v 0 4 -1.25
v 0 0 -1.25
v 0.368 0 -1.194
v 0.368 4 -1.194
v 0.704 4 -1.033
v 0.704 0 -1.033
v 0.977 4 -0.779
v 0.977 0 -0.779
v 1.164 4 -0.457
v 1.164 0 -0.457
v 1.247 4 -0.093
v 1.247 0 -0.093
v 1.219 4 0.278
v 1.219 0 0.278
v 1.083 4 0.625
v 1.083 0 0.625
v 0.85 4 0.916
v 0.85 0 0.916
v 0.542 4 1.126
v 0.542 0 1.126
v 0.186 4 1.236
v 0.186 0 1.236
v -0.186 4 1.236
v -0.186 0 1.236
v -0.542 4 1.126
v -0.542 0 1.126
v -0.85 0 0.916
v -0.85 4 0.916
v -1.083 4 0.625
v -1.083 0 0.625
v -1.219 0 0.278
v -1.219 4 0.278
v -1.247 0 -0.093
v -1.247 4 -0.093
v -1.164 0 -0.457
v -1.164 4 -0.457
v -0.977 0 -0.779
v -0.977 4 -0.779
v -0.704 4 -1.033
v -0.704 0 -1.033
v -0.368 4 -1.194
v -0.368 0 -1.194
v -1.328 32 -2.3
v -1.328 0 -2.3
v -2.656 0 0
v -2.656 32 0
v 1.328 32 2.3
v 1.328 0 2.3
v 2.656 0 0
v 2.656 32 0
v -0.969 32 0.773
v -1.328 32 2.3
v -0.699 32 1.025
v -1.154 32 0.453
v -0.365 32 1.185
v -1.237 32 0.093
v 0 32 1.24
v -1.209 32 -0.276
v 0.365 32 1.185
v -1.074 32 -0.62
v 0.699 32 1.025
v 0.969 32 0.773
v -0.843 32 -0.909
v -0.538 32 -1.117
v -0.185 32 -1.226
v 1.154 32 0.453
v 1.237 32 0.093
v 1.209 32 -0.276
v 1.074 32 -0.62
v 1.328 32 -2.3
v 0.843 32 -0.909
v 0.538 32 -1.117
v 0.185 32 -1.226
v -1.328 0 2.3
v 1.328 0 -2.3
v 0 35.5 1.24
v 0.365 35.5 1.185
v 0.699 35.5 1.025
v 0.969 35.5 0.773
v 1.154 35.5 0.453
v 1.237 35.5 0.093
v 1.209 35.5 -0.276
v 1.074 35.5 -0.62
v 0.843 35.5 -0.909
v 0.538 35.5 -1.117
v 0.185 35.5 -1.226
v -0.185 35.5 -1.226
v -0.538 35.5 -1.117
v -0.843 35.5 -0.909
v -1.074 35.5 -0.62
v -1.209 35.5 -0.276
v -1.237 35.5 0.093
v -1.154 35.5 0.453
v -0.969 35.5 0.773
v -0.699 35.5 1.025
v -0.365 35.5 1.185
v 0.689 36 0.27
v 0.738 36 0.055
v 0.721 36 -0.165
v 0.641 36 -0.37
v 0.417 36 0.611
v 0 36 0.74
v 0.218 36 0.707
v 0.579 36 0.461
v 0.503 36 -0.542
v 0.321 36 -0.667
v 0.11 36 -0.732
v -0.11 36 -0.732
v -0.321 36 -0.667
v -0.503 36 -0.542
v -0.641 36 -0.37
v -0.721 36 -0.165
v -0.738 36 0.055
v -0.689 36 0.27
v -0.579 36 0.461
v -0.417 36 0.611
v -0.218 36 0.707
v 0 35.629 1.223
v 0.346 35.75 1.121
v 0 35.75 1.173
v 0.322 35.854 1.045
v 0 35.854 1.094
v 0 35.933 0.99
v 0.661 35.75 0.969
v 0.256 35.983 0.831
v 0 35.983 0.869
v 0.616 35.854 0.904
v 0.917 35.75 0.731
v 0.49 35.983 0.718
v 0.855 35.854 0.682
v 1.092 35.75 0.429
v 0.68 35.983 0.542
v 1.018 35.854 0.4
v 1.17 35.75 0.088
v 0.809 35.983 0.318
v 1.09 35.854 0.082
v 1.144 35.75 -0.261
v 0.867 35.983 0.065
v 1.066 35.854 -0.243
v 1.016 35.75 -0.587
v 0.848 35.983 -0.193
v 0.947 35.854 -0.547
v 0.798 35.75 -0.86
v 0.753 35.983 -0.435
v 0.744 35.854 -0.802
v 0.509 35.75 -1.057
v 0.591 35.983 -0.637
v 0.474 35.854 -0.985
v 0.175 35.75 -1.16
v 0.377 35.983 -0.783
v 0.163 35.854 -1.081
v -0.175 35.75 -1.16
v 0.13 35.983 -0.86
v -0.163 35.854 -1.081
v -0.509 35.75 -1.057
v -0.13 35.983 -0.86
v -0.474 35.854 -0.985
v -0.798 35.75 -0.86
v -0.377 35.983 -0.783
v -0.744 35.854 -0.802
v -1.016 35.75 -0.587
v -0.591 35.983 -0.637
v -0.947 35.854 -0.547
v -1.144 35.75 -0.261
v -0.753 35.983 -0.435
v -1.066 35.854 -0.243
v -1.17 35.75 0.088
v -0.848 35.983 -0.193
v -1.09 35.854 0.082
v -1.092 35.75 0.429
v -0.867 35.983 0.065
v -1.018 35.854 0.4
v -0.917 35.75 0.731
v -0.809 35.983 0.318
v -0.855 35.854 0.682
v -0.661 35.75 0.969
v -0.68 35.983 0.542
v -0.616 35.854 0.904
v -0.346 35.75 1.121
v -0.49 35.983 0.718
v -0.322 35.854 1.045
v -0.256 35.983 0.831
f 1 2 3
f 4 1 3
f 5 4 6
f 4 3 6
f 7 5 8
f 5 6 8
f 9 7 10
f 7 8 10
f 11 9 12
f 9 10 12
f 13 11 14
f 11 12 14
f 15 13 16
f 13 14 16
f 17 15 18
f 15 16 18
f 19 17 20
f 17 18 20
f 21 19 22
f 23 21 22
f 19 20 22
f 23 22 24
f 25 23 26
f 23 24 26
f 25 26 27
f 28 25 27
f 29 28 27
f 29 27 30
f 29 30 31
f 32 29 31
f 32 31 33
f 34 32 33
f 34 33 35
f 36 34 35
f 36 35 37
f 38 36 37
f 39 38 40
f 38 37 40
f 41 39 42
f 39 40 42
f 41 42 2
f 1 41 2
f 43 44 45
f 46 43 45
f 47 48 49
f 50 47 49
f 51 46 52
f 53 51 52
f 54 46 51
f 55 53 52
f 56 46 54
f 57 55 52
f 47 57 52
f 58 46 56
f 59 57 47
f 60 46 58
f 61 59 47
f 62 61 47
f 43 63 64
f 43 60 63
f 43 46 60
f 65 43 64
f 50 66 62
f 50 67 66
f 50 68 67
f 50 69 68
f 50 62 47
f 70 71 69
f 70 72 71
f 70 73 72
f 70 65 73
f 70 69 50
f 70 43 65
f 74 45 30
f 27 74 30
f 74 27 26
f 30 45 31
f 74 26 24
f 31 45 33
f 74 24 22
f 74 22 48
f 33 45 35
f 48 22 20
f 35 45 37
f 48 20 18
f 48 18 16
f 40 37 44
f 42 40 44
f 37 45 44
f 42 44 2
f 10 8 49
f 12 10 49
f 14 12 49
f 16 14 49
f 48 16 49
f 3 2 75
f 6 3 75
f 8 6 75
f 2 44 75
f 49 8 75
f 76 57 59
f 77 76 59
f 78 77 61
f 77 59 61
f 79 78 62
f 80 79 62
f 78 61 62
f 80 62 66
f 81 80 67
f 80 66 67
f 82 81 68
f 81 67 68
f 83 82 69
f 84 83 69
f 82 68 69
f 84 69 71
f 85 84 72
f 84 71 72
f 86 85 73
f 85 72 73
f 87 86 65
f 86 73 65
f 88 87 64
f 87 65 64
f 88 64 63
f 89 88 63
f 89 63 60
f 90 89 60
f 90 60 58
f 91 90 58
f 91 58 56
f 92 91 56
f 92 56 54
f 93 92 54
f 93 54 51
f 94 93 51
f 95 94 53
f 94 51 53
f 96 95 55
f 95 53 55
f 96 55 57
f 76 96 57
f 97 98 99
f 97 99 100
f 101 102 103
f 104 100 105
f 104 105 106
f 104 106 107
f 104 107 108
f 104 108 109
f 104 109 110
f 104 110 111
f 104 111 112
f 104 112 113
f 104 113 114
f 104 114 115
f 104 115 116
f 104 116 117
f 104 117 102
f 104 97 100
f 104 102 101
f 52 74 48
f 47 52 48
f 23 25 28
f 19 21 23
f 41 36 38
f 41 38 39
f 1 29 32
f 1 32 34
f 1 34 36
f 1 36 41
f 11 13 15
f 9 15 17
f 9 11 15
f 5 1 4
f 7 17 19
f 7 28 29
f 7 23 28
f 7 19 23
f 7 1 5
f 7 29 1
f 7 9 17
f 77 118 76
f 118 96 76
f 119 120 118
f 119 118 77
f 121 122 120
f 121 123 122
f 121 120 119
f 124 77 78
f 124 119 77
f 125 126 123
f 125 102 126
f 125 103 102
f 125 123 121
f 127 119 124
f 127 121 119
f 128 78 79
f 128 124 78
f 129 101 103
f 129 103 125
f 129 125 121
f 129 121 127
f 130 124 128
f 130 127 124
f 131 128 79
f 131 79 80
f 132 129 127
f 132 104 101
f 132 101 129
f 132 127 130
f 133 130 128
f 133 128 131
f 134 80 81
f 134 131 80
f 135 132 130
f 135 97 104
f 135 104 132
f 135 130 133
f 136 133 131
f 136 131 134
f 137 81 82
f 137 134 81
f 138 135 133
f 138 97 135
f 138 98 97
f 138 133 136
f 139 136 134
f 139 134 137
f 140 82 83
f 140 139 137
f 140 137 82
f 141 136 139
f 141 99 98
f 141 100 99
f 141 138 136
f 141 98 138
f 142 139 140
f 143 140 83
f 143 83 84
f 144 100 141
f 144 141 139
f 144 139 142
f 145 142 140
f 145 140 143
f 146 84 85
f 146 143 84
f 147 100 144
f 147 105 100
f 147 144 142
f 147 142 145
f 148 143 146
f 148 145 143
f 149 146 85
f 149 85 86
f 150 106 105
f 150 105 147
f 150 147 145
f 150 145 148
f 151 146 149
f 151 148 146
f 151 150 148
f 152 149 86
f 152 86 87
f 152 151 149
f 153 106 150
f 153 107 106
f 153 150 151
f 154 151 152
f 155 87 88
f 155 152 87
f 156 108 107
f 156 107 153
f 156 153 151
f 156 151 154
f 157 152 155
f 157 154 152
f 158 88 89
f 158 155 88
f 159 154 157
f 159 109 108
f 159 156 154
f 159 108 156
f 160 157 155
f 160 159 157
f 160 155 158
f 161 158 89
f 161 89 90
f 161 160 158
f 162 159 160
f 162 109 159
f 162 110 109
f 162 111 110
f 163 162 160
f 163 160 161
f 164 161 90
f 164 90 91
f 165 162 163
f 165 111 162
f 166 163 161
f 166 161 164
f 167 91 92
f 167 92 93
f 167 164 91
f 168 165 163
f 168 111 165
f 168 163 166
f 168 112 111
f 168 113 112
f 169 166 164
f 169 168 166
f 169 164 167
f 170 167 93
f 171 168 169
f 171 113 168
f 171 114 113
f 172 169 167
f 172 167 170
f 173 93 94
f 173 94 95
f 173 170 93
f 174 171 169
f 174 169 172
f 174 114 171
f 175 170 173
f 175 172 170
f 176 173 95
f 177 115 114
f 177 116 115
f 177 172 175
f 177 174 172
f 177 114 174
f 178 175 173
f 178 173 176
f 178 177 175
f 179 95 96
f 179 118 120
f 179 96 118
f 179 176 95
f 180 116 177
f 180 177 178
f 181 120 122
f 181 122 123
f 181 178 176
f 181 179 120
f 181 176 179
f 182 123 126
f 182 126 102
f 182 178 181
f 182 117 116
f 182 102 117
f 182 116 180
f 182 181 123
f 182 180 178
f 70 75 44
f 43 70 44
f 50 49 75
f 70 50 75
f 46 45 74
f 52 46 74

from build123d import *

# Parameters (mm, degrees)
SALIENTE_EXTRUIR1_DEPTH = 32
CROQUIS_SUPERIOR_R      = 1.24
SALIENTE_EXTRUIR2_DEPTH = 4
REDONDEO1_R             = 0.5
CROQUIS_INFERIOR_R      = 1.25
CORTAR_EXTRUIR1_DEPTH   = 4


with BuildPart() as part:
    # Croquis base → Saliente-Extruir1 (new body)
    with BuildSketch(Plane(origin=(0, 0, 0), x_dir=(1, 0, 0), z_dir=(0, 1, 0))):
        Polygon((2.655811238, 0), (1.327905619, 2.3), (-1.327905619, 2.3), (-2.655811238, 0), (-1.327905619, -2.3), (1.327905619, -2.3), align=None)
    extrude(amount=SALIENTE_EXTRUIR1_DEPTH)

    # Croquis Superior → Saliente-Extruir2 (add)
    with BuildSketch(Plane(origin=(0, 32, 0), x_dir=(1, 0, 0), z_dir=(0, 1, 0))):
        with Locations(Location((0, 0, 0), (0, 0, 270))):
            Circle(CROQUIS_SUPERIOR_R)
    extrude(amount=SALIENTE_EXTRUIR2_DEPTH)

    # Redondeo1
    redondeo1_edges = [part.edges().sort_by_distance(p)[0] for p in [
        (0, 36, -1.24),
    ]]
    fillet(redondeo1_edges, radius=REDONDEO1_R)

    # Croquis inferior → Cortar-Extruir1 (cut)
    with BuildSketch(Plane(origin=(0, 0, 0), x_dir=(-1, 0, 0), z_dir=(0, -1, 0))):
        with Locations(Location((0, 0, 0), (0, 0, 90))):
            Circle(CROQUIS_INFERIOR_R)
    extrude(amount=-CORTAR_EXTRUIR1_DEPTH, mode=Mode.SUBTRACT)


solid = part.part
